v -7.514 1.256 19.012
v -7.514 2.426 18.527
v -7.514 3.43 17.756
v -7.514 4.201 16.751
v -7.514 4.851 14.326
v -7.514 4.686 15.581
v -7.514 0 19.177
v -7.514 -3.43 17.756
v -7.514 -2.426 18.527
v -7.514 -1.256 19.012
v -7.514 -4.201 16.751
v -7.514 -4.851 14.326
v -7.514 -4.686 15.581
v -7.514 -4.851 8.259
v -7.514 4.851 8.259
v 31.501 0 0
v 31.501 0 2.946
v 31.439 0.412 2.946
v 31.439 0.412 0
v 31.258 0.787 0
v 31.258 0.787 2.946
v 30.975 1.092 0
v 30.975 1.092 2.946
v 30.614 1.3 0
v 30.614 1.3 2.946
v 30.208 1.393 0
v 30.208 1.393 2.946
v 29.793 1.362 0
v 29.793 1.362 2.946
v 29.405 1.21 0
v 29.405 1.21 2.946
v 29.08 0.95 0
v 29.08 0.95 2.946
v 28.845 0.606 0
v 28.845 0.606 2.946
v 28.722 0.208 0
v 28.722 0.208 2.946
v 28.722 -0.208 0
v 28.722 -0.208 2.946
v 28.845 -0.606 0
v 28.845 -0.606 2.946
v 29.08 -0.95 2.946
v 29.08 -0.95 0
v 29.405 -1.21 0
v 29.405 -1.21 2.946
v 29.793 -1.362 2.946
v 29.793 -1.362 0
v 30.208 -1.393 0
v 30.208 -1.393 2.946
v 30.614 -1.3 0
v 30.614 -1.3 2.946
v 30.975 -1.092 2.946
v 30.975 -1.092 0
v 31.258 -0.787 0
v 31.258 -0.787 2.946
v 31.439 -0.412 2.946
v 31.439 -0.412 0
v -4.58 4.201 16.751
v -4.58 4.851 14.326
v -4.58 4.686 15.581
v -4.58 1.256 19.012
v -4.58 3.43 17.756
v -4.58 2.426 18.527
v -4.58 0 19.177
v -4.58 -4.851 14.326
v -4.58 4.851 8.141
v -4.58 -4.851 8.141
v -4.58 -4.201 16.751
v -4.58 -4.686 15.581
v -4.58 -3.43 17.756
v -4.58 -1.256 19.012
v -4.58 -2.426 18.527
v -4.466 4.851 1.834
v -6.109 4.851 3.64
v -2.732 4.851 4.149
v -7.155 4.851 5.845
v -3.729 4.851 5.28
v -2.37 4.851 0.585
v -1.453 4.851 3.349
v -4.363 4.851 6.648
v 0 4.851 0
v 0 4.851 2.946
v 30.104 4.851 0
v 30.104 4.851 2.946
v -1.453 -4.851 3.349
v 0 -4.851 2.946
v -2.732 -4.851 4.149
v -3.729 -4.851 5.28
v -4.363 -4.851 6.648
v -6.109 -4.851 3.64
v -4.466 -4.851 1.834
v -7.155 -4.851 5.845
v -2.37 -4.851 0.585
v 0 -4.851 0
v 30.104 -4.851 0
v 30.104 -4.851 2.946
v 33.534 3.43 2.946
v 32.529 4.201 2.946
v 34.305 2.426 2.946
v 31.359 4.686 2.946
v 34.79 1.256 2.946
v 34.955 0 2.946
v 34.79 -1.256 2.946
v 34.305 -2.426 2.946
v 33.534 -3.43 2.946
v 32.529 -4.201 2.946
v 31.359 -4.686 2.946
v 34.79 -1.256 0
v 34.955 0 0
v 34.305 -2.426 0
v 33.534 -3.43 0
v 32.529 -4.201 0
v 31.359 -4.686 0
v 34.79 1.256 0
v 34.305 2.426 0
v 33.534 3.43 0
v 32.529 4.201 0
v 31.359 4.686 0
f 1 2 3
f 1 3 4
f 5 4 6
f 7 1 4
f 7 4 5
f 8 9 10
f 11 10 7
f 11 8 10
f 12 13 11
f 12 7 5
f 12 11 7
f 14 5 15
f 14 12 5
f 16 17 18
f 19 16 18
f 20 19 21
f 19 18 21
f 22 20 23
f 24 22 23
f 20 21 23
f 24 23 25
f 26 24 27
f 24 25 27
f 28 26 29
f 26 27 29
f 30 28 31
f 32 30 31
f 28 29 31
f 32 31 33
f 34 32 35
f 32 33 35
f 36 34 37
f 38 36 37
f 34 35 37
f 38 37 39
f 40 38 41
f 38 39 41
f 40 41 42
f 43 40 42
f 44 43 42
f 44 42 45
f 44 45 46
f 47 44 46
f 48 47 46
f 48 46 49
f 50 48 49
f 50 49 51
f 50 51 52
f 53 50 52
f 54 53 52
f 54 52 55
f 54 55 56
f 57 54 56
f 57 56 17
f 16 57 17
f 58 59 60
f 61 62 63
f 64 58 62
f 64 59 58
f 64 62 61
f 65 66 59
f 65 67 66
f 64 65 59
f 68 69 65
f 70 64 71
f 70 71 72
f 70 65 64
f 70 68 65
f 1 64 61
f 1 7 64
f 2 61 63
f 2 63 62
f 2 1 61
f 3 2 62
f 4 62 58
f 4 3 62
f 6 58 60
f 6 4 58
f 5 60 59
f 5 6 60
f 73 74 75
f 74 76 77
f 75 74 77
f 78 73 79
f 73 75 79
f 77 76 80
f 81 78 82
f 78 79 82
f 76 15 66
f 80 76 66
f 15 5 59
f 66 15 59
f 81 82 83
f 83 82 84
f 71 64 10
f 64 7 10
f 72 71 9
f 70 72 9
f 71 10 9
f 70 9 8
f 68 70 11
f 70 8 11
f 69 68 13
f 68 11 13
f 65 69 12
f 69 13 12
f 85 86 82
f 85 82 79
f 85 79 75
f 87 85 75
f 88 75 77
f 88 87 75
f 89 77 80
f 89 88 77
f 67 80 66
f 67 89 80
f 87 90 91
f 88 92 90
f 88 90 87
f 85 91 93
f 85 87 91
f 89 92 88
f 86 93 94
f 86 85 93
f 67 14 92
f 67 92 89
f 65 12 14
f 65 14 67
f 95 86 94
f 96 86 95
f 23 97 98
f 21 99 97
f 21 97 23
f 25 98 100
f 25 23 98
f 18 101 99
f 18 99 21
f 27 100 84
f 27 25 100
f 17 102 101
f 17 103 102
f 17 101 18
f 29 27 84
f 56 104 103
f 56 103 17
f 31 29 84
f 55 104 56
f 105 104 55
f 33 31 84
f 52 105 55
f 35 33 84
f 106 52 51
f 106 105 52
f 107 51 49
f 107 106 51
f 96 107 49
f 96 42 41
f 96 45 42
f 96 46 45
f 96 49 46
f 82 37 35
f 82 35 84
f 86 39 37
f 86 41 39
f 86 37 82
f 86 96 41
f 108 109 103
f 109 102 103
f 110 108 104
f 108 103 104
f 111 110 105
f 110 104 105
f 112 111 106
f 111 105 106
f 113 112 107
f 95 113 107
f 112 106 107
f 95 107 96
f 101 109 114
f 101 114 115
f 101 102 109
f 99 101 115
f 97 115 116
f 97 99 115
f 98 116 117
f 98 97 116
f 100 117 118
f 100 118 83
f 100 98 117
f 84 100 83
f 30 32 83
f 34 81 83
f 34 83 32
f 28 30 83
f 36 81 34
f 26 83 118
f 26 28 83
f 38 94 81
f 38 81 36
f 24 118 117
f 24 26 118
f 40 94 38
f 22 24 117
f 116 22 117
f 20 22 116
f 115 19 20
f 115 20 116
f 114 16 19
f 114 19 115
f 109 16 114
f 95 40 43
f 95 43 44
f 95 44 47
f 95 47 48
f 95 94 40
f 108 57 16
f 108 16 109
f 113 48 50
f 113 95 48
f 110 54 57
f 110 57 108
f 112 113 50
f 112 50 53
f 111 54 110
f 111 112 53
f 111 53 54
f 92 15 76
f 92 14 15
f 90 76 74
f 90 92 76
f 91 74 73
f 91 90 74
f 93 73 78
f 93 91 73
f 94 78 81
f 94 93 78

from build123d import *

# Parameters (mm, degrees)
F2_DEPTH = 4.8514
F3_R     = 4.85139
F4_R     = 1.397
F5_DEPTH = 25.4


# Not quite as in the source:
# - a variable given as a bare number and used for a length is read in inches; the dataset says mm whatever the document's units were
# - a fillet or chamfer is up to 0.001 mm smaller than in the source, because OpenCascade refuses the exact size


with BuildPart() as f2:
    # F1 (on Front) → F2 (new body, symmetric)
    with BuildSketch(Plane.XZ):
        with BuildLine():
            ThreePointArc((-7.5137404391, 8.2587754484), (-5.3542263452, 2.6761311983), (0, 0))
            Line((0, 0), (34.9550595609, 0))
            Line((34.9550595609, 0), (34.9550595609, 2.9464))
            Line((34.9550595609, 2.9464), (0, 2.9464))
            ThreePointArc((0, 2.9464), (-3.271499032, 4.6780426472), (-4.5800404391, 8.1405578545))
            Line((-4.5800404391, 8.1405578545), (-4.5800404391, 19.177))
            Line((-4.5800404391, 19.177), (-7.5137404391, 19.177))
            Line((-7.5137404391, 19.177), (-7.5137404391, 8.2587754484))
        make_face()
    extrude(amount=F2_DEPTH, both=True)

    # F3 (radius 4.8514 in the source; OpenCascade refuses exactly that, so slightly less here)
    f3_edges = [f2.edges().sort_by_distance(p)[0] for p in [
        (34.95506, -4.8514, 1.4732),
        (34.95506, 4.8514, 1.4732),
        (-6.04689, -4.8514, 19.177),
        (-6.04689, 4.8514, 19.177),
    ]]
    fillet(f3_edges, radius=F3_R)

    # F4 (on face) → F5 (cut)
    with BuildSketch(Plane.XY.offset(2.9464)):
        with Locations((30.1036595609, 0)):
            Circle(F4_R)
    extrude(amount=-F5_DEPTH, mode=Mode.SUBTRACT)


solid = f2.part
